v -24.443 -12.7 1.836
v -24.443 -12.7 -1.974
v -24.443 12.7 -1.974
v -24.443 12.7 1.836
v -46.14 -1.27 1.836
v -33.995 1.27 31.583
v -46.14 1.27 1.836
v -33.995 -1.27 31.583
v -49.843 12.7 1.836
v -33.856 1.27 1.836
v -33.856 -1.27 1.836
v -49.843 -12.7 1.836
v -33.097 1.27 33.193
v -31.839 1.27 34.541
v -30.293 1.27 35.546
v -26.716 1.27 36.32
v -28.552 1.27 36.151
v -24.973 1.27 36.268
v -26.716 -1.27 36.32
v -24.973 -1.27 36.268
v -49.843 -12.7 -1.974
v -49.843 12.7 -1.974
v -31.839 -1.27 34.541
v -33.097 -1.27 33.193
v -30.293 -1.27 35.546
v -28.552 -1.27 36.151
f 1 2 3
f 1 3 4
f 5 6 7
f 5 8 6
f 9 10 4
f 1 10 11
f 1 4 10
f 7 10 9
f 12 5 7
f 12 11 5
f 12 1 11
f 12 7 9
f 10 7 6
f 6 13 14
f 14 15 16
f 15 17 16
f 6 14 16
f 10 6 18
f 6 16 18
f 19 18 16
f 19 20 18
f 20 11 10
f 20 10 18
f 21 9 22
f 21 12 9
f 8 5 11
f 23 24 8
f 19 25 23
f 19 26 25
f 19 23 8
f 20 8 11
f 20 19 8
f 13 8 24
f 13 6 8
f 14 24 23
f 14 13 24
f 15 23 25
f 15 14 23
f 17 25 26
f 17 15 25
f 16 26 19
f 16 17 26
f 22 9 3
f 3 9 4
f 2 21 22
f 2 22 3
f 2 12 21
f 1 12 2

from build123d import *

# Parameters (mm, degrees)
F1_DEPTH = 12.7
F2_DEPTH = 1.27
F3_R     = 7.62


# Not quite as in the source:
# - a feature names something its author has since deleted; it is built from what else it names


with BuildPart() as f1:
    # F0 (on Front) → F1 (new body, symmetric)
    with BuildSketch(Plane.XZ):
        Polygon((-46.139964322, 1.8357970985), (-49.8430333048, 1.8357970985), (-49.8430333048, -1.9742029015), (-24.4430333048, -1.9742029015), (-24.4430333048, 1.8357970985), (-33.8560845901, 1.8357970985), align=None)
    extrude(amount=F1_DEPTH, both=True)

    # F0 (on Front) → F2 (join, symmetric)
    with BuildSketch(Plane.XZ):
        Polygon((-31.998090446, 36.4759527147), (-46.139964322, 1.8357970985), (-33.8560845901, 1.8357970985), (-24.9732534132, 36.2684692324), align=None)
    extrude(amount=F2_DEPTH, both=True)

    # F3
    f3_edges = [f1.edges().sort_by_distance(p)[0] for p in [
        (-31.99809, 0, 36.475953),
    ]]
    fillet(f3_edges, radius=F3_R)


solid = f1.part
